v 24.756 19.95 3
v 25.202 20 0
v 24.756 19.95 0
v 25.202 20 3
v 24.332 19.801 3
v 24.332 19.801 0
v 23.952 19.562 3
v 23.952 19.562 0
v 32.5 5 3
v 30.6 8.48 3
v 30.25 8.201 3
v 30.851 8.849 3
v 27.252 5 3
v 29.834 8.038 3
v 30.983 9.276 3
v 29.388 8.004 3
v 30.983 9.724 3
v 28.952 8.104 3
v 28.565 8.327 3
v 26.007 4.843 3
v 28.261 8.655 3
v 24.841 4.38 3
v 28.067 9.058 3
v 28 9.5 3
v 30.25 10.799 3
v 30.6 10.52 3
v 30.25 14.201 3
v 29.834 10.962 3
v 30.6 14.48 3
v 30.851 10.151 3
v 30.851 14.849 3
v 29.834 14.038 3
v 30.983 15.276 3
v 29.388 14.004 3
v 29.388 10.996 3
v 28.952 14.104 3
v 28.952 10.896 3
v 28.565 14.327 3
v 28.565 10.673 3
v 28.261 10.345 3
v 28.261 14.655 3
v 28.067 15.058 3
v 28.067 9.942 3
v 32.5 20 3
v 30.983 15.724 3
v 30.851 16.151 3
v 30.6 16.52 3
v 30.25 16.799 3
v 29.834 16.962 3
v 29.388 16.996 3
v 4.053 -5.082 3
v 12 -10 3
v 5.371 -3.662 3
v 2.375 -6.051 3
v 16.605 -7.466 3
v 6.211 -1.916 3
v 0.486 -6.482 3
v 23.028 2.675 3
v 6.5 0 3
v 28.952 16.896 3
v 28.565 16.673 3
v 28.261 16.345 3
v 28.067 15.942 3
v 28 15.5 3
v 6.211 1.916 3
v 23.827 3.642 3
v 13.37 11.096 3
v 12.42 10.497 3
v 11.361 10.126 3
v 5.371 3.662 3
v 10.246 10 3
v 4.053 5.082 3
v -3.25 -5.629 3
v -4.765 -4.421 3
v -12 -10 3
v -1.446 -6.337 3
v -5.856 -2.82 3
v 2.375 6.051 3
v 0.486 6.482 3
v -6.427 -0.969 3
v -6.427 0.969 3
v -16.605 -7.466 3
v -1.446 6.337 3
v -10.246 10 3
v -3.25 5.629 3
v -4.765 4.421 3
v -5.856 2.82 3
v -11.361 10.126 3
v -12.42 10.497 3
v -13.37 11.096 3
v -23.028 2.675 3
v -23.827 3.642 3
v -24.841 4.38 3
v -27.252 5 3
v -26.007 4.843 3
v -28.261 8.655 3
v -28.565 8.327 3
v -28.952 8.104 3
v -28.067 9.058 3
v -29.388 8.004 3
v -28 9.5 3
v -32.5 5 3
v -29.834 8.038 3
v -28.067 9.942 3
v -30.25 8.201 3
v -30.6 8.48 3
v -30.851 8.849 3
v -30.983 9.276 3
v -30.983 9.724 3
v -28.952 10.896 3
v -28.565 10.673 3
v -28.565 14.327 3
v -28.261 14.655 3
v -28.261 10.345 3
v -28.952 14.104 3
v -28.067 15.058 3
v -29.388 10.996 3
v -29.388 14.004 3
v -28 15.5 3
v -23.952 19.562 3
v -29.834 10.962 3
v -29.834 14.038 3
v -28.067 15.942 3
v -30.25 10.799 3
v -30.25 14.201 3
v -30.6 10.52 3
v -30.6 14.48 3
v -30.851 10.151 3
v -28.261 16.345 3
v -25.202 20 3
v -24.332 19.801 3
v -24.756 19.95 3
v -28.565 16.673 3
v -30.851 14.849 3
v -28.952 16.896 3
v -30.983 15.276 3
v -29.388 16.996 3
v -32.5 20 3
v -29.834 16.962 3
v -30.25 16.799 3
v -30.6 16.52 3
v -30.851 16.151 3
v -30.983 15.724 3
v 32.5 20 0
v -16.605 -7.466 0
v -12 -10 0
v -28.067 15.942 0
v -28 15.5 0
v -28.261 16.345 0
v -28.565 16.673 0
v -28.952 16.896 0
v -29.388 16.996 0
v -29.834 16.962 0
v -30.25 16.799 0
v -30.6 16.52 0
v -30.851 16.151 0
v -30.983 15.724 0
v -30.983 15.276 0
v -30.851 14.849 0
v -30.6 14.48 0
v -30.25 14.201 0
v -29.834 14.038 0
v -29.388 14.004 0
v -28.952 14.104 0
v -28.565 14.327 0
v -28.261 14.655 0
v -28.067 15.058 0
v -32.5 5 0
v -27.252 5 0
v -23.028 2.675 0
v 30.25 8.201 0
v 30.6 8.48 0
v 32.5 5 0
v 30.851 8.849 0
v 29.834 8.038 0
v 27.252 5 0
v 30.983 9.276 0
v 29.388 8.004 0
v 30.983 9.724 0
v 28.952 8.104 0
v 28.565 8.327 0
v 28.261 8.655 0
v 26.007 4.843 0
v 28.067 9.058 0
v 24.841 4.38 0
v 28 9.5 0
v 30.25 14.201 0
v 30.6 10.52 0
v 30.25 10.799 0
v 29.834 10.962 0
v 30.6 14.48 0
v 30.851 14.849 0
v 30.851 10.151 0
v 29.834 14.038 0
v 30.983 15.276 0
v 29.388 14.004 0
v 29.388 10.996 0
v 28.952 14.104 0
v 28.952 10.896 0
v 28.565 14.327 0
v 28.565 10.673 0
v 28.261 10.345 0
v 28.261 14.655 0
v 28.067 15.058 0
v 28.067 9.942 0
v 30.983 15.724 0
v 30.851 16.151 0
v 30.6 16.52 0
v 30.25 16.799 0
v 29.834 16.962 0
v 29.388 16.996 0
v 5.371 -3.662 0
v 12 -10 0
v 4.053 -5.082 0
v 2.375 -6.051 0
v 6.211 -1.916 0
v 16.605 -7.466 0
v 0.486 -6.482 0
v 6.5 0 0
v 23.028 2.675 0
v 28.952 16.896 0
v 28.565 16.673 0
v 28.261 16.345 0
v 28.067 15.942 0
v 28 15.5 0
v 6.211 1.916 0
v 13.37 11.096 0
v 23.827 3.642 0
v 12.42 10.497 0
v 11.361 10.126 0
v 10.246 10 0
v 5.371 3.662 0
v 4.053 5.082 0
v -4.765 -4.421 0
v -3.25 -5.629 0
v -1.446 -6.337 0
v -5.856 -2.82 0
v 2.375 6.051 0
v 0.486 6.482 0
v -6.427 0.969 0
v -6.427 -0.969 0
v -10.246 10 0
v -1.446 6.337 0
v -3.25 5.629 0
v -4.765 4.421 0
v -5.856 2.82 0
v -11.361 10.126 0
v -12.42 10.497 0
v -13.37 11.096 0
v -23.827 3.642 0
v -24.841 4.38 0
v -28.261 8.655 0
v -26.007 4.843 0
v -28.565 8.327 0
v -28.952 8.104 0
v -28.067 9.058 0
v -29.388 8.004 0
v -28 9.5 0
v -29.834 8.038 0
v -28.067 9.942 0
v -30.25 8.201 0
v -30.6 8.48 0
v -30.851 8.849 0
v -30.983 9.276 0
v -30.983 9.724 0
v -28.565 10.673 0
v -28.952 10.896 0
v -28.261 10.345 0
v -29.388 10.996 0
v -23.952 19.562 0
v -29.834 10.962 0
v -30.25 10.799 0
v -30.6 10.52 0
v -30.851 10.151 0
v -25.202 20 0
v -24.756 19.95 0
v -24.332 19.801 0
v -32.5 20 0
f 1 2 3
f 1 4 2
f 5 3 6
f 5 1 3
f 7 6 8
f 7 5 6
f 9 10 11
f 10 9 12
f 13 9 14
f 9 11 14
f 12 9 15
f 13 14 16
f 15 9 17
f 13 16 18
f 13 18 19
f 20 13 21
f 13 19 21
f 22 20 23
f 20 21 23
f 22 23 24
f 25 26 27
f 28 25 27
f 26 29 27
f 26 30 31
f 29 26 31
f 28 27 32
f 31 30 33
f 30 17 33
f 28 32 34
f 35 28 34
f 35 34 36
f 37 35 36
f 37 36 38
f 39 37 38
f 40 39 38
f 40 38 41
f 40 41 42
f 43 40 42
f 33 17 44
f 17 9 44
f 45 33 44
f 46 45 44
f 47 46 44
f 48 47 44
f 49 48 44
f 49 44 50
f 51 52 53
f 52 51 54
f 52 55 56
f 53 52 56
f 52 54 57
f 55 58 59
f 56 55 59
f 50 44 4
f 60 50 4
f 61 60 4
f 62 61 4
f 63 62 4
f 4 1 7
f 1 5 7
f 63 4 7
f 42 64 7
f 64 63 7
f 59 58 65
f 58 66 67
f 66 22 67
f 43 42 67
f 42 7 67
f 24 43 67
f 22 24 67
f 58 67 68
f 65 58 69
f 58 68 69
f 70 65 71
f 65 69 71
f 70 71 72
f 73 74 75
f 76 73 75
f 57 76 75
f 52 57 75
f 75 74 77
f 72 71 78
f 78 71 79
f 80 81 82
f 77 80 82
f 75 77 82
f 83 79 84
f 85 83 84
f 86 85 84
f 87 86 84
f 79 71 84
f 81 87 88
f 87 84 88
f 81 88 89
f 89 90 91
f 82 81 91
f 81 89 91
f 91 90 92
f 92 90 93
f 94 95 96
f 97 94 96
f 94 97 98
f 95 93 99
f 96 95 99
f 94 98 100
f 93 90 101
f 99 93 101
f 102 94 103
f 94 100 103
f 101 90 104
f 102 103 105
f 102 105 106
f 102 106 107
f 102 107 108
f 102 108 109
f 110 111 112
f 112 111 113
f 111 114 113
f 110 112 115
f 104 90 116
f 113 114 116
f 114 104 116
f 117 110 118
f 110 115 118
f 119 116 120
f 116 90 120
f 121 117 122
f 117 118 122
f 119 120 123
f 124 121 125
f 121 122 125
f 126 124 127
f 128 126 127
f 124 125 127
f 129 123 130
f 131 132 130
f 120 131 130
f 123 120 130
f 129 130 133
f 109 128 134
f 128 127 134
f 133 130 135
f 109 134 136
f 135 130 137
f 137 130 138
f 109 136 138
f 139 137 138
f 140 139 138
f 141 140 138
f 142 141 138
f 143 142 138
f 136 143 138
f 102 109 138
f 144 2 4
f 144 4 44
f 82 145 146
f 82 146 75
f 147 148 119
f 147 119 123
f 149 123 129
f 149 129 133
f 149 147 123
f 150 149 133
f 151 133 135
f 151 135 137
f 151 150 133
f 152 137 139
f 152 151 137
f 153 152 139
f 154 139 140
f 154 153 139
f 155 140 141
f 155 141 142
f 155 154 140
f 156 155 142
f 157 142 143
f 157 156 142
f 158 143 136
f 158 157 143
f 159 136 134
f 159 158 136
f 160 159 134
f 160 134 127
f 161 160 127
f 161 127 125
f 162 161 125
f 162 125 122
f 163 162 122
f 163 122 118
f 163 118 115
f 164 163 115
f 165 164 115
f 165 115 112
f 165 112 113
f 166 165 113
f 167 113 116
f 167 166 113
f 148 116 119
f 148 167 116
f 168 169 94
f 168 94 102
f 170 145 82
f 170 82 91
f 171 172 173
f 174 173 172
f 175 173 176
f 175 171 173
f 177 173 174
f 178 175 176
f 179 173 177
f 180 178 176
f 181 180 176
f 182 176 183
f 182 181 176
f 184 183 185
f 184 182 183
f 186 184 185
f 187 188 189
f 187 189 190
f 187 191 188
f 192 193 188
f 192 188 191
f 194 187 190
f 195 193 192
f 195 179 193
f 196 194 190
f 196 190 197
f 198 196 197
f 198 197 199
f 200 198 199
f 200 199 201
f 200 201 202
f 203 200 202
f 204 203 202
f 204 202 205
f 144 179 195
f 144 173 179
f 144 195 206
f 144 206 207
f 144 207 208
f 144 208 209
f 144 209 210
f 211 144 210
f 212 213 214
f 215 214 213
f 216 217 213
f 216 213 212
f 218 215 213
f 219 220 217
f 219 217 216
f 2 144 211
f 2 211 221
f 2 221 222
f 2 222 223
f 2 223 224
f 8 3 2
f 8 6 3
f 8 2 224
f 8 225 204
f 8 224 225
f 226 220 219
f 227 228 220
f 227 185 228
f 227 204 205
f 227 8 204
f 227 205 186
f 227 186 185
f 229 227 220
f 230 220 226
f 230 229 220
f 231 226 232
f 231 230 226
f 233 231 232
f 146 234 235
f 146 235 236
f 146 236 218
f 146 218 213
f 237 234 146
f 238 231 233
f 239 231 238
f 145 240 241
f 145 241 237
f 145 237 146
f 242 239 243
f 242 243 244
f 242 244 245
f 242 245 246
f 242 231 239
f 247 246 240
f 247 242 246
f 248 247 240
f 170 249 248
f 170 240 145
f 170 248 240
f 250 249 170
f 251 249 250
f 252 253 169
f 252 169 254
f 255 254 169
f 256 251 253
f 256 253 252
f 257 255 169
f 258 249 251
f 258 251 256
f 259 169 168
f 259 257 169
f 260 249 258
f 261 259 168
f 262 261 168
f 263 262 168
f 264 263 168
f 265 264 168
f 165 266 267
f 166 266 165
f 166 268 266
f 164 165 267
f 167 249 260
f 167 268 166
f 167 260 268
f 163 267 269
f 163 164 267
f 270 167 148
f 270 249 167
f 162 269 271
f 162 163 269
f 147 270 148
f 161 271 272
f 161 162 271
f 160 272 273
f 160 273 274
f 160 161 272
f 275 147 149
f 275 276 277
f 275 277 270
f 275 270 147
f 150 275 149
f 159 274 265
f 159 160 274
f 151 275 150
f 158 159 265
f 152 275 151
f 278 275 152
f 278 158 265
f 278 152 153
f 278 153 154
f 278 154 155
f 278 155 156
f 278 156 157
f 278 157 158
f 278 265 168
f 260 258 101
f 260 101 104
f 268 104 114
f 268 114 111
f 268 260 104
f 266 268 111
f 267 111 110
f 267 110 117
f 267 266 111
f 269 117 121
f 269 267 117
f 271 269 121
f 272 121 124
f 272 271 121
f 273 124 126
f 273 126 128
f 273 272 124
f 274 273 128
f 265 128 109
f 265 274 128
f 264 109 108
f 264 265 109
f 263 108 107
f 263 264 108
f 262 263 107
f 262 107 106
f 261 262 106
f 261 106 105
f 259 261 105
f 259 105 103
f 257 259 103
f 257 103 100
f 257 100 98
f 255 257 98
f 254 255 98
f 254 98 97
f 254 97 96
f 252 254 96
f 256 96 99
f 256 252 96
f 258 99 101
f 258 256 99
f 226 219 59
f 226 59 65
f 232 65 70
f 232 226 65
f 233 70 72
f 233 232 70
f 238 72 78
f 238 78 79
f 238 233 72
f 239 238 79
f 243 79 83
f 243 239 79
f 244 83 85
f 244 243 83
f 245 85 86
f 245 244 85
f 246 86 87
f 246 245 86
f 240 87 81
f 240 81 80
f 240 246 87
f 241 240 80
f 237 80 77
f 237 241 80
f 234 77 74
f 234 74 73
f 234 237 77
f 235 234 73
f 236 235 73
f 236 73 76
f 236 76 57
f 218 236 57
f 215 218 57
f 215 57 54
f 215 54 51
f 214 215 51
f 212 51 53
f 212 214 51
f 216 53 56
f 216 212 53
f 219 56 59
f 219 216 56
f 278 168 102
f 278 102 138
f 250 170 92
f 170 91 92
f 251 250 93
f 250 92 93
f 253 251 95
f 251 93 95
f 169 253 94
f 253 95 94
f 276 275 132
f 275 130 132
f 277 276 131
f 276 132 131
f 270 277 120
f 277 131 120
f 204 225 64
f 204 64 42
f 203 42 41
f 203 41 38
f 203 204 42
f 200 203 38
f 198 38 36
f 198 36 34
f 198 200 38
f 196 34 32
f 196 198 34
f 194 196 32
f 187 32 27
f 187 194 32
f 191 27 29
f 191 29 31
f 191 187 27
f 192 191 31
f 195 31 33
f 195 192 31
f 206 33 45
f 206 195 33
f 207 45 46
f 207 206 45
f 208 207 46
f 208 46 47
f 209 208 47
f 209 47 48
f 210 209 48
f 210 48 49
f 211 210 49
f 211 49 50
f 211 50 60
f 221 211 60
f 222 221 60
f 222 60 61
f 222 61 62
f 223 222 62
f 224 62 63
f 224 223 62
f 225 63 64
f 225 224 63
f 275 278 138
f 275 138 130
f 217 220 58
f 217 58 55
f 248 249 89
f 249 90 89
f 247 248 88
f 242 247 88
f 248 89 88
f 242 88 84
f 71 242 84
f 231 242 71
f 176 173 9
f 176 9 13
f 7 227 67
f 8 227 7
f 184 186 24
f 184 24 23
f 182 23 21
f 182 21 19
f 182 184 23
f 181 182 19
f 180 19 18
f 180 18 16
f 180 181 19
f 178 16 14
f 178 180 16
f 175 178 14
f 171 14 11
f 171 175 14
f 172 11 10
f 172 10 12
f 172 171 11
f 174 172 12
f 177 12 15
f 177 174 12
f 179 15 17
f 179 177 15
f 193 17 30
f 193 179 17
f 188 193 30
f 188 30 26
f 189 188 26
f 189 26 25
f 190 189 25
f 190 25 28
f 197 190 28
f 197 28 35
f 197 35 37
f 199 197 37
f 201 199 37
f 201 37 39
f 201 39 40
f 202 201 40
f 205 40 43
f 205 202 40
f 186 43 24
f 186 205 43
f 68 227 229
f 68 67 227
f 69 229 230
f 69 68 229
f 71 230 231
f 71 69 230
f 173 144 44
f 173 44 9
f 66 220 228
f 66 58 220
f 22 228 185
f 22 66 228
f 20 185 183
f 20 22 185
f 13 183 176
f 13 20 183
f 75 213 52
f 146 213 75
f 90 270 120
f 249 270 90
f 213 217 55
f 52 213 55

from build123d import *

# Parameters (mm, degrees)
SKETCH_1_R      = 6.5
SKETCH_1_R_2    = 1.5
EXTRUDE_1_DEPTH = 3
FILLET_1_R      = 5
CHAMFER_1_SIZE  = 3
FILLET_3_R      = 5
FILLET_4_R      = 2


with BuildPart() as part:
    # 草图1 → 凸台-拉伸1 (new body)
    with BuildSketch(Plane.XY):
        Polygon((15, -10), (-15, -10), (-24.5, 5), (-32.5, 5), (-32.5, 20), (-24.5, 20), (-12, 10), (12, 10), (24.5, 20), (32.5, 20), (32.5, 5), (24.5, 5), align=None)
        Circle(SKETCH_1_R, mode=Mode.SUBTRACT)
        with Locations((-29.5, 15.5)):
            Circle(SKETCH_1_R_2, mode=Mode.SUBTRACT)
        with Locations(Location((29.5, 9.5, 0), (0, 0, 180))):
            Circle(SKETCH_1_R_2, mode=Mode.SUBTRACT)
        with Locations((-29.5, 9.5)):
            Circle(SKETCH_1_R_2, mode=Mode.SUBTRACT)
        with Locations(Location((29.5, 15.5, 0), (0, 0, 180))):
            Circle(SKETCH_1_R_2, mode=Mode.SUBTRACT)
    extrude(amount=EXTRUDE_1_DEPTH)

    # 圆角1
    fillet_1_edges = [part.edges().sort_by_distance(p)[0] for p in [
        (-12, 10, 1.5),
        (12, 10, 1.5),
    ]]
    fillet(fillet_1_edges, radius=FILLET_1_R)

    # 倒角1
    chamfer_1_edges = [part.edges().sort_by_distance(p)[0] for p in [
        (15, -10, 1.5),
        (-15, -10, 1.5),
    ]]
    chamfer(chamfer_1_edges, length=CHAMFER_1_SIZE)

    # 圆角3
    fillet_3_edges = [part.edges().sort_by_distance(p)[0] for p in [
        (-24.5, 5, 1.5),
        (24.5, 5, 1.5),
    ]]
    fillet(fillet_3_edges, radius=FILLET_3_R)

    # 圆角4
    fillet_4_edges = [part.edges().sort_by_distance(p)[0] for p in [
        (-24.5, 20, 1.5),
        (24.5, 20, 1.5),
    ]]
    fillet(fillet_4_edges, radius=FILLET_4_R)


solid = part.part
